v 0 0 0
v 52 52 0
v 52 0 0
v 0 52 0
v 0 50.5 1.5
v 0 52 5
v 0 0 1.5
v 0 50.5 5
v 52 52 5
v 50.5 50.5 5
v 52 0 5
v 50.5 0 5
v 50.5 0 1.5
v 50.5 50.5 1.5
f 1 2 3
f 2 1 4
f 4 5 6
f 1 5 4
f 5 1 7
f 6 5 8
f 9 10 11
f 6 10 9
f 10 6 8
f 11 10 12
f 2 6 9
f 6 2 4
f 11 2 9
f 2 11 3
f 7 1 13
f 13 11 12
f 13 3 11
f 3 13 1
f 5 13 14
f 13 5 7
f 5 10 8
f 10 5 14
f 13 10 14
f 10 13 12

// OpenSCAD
$fn = 100;

footerShell = 2;
verticalShell = 1.5;

plexiThickness = 2.5;

// legSide = 49.25;
legSide = 50.5;

totalFootHeight = 26;

lowerFootHeight = totalFootHeight / 2 - 1;

screwShaftRadius = 2;   // e
screwWellDepth = 5;     // b
screwHeadRadius = 4;    // f
screwHeadDepth = 2;    // f
topRadius = legSide / 4; // D
bottomRadius = legSide / 3;   // A

difference() {
linear_extrude(5) square(legSide + verticalShell, false);
translate ([0,0,verticalShell]) linear_extrude(5) square(legSide, false);
}

// genericFootBottom();
// genericFootTop();

module topShaft() {
rotate_extrude(angle = 360, convexity = 10)
    polygon (
    [
        [screwHeadRadius, lowerFootHeight-1],
        [screwHeadRadius,lowerFootHeight + screwHeadDepth],
        [screwShaftRadius, lowerFootHeight + screwHeadDepth], 
        [screwShaftRadius, totalFootHeight + 1],
        [0, totalFootHeight + 1],
        [0, lowerFootHeight- 1]
    ]
    );
}


module genericFootTop() {
    
    difference() {
        linear_extrude(totalFootHeight) 
            square(legSide, true);
        translate([0,0,-1]) 
        negativeFootRing();
        topShaft();
    }

}


module genericFootBottom() {
    
    difference() {
        linear_extrude(footerShell) 
            square(legSide, true);
        cylinder(2 * footerShell, r = screwShaftRadius);
    }

    footRing();

}

module negativeFootRing() {
     rotate_extrude(angle = 360, convexity = 10)
    polygon (
    [
        [0, 0],
        [0,lowerFootHeight],
        [topRadius, lowerFootHeight],
        [bottomRadius, 1],
        [bottomRadius, 0]
    ]
    );
   
}

module footRing() {
    rotate_extrude(angle = 360, convexity = 10)
    polygon (
    [
        [screwShaftRadius, 0],
        [screwShaftRadius, screwWellDepth],
        [screwHeadRadius, screwWellDepth],
        [screwHeadRadius, lowerFootHeight],
        [topRadius, lowerFootHeight],
        [bottomRadius, 0]
    ]
    );
    
}
